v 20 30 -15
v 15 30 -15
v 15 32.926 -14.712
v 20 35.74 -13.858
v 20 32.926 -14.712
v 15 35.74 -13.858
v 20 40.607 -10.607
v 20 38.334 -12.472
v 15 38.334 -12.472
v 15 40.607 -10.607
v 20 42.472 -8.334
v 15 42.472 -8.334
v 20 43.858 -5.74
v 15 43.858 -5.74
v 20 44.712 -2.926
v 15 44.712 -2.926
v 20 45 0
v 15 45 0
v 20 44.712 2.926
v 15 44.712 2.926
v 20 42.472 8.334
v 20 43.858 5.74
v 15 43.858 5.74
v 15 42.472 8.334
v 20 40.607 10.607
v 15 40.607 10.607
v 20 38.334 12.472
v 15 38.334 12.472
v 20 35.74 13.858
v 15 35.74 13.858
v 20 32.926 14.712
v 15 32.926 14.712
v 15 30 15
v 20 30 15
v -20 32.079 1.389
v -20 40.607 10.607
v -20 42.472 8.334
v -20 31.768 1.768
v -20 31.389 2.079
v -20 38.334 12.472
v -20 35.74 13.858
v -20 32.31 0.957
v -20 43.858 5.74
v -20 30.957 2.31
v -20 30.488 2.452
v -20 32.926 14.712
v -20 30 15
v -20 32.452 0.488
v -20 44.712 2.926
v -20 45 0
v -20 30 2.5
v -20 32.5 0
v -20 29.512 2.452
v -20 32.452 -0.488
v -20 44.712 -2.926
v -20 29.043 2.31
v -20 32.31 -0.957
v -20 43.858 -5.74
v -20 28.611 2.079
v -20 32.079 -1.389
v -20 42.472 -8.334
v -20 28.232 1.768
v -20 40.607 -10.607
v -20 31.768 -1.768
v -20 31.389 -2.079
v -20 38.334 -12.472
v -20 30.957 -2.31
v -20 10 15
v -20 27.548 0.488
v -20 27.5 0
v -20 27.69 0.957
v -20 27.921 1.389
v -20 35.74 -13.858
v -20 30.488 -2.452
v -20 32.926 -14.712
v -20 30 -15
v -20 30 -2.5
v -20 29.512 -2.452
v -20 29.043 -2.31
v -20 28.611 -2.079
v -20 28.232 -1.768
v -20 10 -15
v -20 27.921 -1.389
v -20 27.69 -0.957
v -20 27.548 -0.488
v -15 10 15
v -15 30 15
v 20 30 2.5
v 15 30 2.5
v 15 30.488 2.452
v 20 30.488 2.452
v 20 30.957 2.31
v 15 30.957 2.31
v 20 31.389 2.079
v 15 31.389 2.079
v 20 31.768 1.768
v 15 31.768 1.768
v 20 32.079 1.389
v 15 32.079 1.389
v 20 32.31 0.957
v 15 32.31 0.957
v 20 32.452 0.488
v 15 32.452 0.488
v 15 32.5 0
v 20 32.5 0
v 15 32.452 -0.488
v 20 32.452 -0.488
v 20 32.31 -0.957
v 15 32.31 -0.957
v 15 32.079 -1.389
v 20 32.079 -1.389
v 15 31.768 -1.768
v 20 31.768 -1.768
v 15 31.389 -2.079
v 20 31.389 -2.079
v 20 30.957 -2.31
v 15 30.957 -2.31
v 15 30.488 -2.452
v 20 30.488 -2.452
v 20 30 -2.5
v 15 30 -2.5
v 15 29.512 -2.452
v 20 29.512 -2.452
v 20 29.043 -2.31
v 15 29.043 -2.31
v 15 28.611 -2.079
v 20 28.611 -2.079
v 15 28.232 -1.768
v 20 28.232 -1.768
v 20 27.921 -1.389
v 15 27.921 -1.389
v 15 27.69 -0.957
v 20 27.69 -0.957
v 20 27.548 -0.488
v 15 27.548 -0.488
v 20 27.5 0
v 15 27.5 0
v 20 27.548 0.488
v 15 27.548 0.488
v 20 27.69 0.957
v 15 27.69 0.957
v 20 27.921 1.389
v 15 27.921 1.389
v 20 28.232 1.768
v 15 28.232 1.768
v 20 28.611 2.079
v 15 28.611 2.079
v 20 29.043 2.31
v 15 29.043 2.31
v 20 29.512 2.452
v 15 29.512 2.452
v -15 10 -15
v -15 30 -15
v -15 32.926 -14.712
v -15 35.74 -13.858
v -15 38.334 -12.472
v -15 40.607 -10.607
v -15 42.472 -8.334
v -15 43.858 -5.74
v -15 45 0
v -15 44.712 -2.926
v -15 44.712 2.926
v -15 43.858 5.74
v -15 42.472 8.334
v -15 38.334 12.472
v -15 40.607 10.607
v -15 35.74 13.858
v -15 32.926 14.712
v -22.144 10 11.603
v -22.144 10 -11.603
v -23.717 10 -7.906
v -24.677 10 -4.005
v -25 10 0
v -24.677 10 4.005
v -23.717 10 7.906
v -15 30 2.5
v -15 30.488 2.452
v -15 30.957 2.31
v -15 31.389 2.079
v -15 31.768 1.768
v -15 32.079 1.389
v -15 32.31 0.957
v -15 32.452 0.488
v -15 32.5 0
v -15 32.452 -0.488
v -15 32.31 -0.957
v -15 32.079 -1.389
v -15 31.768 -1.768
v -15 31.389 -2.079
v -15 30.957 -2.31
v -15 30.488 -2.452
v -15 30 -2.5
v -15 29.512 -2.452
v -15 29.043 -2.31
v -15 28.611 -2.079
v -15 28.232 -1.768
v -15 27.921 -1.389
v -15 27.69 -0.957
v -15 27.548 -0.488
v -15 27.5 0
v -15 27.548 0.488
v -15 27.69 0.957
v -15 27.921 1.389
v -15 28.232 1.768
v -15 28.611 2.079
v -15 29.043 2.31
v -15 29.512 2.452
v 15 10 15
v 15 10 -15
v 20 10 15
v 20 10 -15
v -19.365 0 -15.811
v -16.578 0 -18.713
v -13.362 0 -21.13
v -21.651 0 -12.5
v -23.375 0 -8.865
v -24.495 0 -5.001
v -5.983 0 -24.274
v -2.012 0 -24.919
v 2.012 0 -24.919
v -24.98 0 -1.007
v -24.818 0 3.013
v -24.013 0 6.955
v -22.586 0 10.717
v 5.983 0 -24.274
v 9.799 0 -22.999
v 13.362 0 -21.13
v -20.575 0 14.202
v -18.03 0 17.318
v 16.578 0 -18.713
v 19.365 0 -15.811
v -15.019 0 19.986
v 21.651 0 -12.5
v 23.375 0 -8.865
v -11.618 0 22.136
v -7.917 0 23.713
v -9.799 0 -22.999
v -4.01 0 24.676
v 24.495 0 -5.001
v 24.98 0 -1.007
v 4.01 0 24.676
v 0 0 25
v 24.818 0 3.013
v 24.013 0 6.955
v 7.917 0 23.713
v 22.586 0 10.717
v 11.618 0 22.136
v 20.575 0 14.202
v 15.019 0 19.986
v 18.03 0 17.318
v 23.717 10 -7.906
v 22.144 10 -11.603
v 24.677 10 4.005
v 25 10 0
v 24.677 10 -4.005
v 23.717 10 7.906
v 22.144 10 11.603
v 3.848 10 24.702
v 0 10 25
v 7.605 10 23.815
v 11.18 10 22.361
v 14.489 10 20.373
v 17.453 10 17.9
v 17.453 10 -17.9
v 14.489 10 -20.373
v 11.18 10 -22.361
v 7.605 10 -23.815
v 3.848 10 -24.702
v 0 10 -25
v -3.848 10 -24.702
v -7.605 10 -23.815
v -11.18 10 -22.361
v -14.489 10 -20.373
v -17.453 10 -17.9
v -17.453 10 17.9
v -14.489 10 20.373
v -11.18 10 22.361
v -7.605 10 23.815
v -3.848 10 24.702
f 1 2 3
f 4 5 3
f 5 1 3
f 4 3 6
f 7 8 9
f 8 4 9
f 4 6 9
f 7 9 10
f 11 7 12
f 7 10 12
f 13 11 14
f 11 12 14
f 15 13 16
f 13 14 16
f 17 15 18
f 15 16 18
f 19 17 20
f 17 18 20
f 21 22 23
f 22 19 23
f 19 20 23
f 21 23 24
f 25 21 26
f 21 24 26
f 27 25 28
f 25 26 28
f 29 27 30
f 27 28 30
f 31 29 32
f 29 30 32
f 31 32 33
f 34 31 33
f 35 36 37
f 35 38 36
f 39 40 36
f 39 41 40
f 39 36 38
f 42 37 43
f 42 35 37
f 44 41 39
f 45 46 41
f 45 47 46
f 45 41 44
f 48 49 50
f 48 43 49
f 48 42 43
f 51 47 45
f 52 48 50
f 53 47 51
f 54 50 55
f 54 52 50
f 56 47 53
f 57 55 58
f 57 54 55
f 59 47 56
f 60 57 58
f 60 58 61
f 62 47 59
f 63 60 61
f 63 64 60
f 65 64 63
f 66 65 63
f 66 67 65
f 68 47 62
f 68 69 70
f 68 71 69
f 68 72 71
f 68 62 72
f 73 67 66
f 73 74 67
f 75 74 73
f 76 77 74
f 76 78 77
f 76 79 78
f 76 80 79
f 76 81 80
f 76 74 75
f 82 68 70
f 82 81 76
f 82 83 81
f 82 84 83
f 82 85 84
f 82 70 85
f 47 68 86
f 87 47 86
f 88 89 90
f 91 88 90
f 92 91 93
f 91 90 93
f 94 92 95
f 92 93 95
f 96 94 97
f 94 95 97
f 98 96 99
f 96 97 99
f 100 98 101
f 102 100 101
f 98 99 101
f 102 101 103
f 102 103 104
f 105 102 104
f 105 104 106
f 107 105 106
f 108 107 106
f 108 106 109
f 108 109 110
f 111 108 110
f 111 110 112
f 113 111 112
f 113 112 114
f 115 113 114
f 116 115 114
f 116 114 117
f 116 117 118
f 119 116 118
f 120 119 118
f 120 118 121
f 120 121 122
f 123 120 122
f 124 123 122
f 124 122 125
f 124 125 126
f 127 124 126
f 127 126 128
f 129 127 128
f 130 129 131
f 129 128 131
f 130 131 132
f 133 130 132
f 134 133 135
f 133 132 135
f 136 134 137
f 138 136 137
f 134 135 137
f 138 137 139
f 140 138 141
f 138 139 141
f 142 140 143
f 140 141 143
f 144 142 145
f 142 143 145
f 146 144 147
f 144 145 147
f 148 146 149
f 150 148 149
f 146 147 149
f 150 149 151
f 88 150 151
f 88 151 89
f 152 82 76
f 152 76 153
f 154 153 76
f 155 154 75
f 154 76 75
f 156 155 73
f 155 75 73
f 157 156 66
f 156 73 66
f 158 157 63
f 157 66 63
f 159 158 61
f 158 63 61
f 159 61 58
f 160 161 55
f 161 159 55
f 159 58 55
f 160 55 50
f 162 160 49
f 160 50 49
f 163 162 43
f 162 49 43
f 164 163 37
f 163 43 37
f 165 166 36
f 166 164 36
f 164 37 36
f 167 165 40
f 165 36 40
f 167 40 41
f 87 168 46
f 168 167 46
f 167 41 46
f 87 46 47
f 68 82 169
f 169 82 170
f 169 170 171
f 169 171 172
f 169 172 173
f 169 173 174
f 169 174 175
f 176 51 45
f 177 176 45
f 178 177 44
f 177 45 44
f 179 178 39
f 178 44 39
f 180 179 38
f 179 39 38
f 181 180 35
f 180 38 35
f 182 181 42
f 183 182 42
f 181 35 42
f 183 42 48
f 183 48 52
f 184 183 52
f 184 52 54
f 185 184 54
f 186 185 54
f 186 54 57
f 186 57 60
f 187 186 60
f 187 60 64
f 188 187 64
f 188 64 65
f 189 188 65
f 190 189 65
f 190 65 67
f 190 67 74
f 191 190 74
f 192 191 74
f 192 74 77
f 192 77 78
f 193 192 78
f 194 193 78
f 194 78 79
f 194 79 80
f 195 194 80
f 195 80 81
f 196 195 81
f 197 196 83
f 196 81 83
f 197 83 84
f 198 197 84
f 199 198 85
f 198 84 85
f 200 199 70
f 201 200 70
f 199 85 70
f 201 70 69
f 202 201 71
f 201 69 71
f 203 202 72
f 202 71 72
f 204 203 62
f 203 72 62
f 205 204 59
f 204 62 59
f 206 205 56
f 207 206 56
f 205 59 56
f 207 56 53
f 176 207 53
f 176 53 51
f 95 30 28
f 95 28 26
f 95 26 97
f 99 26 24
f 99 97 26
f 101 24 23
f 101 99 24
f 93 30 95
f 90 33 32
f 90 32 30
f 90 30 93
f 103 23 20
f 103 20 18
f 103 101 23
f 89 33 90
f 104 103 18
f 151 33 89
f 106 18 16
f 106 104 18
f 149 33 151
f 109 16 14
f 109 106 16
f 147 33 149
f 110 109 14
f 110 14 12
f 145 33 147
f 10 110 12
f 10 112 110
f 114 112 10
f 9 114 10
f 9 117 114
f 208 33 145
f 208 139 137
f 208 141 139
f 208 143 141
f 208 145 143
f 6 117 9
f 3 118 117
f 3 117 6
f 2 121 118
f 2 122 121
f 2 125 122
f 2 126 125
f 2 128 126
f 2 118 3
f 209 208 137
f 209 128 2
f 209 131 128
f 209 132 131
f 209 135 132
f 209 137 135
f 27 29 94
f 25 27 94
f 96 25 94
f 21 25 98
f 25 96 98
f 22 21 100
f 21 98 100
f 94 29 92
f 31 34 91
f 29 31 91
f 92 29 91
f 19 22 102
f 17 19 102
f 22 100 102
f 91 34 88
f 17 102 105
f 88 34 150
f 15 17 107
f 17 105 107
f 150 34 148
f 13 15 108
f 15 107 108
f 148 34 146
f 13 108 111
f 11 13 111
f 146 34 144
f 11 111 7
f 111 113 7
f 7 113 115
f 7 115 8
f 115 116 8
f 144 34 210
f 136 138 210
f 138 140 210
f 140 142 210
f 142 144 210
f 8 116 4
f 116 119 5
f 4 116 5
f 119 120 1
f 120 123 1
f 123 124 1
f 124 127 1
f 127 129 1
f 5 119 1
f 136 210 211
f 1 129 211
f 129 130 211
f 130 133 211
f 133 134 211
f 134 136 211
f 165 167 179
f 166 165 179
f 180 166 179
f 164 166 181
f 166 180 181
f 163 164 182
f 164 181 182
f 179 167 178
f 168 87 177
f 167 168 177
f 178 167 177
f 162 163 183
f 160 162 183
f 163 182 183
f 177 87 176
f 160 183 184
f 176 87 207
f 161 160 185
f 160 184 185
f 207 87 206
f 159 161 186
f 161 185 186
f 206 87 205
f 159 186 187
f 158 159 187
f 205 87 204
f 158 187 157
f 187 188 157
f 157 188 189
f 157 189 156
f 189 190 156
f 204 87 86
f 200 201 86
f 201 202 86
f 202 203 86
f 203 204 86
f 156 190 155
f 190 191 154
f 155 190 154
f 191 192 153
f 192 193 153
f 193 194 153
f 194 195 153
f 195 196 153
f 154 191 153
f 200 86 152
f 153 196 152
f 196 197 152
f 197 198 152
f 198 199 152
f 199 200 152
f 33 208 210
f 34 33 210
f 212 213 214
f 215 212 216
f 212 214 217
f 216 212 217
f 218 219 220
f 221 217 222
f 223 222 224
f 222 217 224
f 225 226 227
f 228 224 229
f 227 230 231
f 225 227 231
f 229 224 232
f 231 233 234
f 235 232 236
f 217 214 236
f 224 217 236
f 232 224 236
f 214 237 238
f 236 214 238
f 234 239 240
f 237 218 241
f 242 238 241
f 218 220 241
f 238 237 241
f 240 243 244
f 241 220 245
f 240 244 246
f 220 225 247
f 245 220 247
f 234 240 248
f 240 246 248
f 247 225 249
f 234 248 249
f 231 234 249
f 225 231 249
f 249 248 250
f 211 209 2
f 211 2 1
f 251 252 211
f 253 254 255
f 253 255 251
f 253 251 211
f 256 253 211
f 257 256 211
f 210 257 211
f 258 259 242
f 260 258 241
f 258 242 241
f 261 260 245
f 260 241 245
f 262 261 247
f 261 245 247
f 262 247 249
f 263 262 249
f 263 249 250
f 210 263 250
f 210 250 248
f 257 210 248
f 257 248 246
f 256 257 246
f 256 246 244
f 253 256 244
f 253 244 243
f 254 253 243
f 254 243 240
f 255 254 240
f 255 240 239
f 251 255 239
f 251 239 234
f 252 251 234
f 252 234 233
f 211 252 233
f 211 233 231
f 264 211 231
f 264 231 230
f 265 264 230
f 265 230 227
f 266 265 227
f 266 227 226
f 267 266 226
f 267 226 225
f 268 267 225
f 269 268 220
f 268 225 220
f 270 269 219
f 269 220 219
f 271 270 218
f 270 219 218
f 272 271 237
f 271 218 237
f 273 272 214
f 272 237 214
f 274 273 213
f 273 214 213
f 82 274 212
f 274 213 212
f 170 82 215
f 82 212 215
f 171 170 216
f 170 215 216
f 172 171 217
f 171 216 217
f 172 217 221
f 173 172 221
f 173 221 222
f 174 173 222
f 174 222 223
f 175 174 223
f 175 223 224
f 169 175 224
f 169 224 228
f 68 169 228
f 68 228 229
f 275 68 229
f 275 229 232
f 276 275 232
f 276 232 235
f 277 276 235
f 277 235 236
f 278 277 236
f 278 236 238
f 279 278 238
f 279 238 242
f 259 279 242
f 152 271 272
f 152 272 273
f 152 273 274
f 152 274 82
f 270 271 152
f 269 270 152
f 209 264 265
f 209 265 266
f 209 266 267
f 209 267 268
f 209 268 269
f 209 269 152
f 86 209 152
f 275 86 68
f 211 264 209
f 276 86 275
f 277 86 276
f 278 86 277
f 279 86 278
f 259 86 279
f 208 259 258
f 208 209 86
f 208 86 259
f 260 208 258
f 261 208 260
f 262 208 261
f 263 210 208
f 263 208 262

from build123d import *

# Parameters (mm, degrees)
SKETCH1_R           = 25
BOSS_EXTRUDE1_DEPTH = 10
SKETCH2_W           = 5
SKETCH2_H           = 30
BOSS_EXTRUDE2_DEPTH = 40
SKETCH3_R           = 2.5
CUT_EXTRUDE1_DEPTH  = 72.763500472


with BuildPart() as part:
    # Sketch1 → Boss-Extrude1 (new body)
    with BuildSketch(Plane(origin=(0, 0, 0), x_dir=(1, 0, 0), z_dir=(0, 1, 0))):
        with Locations(Location((0, 0, 0), (0, 0, 270))):
            Circle(SKETCH1_R)
    extrude(amount=BOSS_EXTRUDE1_DEPTH)

    # Sketch2 → Boss-Extrude2 (add)
    with BuildSketch(Plane(origin=(0, 10, 0), x_dir=(1, 0, 0), z_dir=(0, 1, 0))):
        with Locations((17.5, 0)):
            Rectangle(SKETCH2_W, SKETCH2_H)
        with Locations((-17.5, 0)):
            Rectangle(SKETCH2_W, SKETCH2_H)
    extrude(amount=BOSS_EXTRUDE2_DEPTH)

    # Sketch3 → Cut-Extrude1 (cut, through all)
    with BuildSketch(Plane.ZY.offset(20)):
        with BuildLine():
            Line((-15, 50), (-15, 30))
            ThreePointArc((-15, 30), (0, 45), (15, 30))
            Line((15, 30), (15, 50))
            Line((15, 50), (-15, 50))
        make_face()
        with Locations((0, 30)):
            Circle(SKETCH3_R)
    extrude(amount=-CUT_EXTRUDE1_DEPTH, mode=Mode.SUBTRACT)


solid = part.part
